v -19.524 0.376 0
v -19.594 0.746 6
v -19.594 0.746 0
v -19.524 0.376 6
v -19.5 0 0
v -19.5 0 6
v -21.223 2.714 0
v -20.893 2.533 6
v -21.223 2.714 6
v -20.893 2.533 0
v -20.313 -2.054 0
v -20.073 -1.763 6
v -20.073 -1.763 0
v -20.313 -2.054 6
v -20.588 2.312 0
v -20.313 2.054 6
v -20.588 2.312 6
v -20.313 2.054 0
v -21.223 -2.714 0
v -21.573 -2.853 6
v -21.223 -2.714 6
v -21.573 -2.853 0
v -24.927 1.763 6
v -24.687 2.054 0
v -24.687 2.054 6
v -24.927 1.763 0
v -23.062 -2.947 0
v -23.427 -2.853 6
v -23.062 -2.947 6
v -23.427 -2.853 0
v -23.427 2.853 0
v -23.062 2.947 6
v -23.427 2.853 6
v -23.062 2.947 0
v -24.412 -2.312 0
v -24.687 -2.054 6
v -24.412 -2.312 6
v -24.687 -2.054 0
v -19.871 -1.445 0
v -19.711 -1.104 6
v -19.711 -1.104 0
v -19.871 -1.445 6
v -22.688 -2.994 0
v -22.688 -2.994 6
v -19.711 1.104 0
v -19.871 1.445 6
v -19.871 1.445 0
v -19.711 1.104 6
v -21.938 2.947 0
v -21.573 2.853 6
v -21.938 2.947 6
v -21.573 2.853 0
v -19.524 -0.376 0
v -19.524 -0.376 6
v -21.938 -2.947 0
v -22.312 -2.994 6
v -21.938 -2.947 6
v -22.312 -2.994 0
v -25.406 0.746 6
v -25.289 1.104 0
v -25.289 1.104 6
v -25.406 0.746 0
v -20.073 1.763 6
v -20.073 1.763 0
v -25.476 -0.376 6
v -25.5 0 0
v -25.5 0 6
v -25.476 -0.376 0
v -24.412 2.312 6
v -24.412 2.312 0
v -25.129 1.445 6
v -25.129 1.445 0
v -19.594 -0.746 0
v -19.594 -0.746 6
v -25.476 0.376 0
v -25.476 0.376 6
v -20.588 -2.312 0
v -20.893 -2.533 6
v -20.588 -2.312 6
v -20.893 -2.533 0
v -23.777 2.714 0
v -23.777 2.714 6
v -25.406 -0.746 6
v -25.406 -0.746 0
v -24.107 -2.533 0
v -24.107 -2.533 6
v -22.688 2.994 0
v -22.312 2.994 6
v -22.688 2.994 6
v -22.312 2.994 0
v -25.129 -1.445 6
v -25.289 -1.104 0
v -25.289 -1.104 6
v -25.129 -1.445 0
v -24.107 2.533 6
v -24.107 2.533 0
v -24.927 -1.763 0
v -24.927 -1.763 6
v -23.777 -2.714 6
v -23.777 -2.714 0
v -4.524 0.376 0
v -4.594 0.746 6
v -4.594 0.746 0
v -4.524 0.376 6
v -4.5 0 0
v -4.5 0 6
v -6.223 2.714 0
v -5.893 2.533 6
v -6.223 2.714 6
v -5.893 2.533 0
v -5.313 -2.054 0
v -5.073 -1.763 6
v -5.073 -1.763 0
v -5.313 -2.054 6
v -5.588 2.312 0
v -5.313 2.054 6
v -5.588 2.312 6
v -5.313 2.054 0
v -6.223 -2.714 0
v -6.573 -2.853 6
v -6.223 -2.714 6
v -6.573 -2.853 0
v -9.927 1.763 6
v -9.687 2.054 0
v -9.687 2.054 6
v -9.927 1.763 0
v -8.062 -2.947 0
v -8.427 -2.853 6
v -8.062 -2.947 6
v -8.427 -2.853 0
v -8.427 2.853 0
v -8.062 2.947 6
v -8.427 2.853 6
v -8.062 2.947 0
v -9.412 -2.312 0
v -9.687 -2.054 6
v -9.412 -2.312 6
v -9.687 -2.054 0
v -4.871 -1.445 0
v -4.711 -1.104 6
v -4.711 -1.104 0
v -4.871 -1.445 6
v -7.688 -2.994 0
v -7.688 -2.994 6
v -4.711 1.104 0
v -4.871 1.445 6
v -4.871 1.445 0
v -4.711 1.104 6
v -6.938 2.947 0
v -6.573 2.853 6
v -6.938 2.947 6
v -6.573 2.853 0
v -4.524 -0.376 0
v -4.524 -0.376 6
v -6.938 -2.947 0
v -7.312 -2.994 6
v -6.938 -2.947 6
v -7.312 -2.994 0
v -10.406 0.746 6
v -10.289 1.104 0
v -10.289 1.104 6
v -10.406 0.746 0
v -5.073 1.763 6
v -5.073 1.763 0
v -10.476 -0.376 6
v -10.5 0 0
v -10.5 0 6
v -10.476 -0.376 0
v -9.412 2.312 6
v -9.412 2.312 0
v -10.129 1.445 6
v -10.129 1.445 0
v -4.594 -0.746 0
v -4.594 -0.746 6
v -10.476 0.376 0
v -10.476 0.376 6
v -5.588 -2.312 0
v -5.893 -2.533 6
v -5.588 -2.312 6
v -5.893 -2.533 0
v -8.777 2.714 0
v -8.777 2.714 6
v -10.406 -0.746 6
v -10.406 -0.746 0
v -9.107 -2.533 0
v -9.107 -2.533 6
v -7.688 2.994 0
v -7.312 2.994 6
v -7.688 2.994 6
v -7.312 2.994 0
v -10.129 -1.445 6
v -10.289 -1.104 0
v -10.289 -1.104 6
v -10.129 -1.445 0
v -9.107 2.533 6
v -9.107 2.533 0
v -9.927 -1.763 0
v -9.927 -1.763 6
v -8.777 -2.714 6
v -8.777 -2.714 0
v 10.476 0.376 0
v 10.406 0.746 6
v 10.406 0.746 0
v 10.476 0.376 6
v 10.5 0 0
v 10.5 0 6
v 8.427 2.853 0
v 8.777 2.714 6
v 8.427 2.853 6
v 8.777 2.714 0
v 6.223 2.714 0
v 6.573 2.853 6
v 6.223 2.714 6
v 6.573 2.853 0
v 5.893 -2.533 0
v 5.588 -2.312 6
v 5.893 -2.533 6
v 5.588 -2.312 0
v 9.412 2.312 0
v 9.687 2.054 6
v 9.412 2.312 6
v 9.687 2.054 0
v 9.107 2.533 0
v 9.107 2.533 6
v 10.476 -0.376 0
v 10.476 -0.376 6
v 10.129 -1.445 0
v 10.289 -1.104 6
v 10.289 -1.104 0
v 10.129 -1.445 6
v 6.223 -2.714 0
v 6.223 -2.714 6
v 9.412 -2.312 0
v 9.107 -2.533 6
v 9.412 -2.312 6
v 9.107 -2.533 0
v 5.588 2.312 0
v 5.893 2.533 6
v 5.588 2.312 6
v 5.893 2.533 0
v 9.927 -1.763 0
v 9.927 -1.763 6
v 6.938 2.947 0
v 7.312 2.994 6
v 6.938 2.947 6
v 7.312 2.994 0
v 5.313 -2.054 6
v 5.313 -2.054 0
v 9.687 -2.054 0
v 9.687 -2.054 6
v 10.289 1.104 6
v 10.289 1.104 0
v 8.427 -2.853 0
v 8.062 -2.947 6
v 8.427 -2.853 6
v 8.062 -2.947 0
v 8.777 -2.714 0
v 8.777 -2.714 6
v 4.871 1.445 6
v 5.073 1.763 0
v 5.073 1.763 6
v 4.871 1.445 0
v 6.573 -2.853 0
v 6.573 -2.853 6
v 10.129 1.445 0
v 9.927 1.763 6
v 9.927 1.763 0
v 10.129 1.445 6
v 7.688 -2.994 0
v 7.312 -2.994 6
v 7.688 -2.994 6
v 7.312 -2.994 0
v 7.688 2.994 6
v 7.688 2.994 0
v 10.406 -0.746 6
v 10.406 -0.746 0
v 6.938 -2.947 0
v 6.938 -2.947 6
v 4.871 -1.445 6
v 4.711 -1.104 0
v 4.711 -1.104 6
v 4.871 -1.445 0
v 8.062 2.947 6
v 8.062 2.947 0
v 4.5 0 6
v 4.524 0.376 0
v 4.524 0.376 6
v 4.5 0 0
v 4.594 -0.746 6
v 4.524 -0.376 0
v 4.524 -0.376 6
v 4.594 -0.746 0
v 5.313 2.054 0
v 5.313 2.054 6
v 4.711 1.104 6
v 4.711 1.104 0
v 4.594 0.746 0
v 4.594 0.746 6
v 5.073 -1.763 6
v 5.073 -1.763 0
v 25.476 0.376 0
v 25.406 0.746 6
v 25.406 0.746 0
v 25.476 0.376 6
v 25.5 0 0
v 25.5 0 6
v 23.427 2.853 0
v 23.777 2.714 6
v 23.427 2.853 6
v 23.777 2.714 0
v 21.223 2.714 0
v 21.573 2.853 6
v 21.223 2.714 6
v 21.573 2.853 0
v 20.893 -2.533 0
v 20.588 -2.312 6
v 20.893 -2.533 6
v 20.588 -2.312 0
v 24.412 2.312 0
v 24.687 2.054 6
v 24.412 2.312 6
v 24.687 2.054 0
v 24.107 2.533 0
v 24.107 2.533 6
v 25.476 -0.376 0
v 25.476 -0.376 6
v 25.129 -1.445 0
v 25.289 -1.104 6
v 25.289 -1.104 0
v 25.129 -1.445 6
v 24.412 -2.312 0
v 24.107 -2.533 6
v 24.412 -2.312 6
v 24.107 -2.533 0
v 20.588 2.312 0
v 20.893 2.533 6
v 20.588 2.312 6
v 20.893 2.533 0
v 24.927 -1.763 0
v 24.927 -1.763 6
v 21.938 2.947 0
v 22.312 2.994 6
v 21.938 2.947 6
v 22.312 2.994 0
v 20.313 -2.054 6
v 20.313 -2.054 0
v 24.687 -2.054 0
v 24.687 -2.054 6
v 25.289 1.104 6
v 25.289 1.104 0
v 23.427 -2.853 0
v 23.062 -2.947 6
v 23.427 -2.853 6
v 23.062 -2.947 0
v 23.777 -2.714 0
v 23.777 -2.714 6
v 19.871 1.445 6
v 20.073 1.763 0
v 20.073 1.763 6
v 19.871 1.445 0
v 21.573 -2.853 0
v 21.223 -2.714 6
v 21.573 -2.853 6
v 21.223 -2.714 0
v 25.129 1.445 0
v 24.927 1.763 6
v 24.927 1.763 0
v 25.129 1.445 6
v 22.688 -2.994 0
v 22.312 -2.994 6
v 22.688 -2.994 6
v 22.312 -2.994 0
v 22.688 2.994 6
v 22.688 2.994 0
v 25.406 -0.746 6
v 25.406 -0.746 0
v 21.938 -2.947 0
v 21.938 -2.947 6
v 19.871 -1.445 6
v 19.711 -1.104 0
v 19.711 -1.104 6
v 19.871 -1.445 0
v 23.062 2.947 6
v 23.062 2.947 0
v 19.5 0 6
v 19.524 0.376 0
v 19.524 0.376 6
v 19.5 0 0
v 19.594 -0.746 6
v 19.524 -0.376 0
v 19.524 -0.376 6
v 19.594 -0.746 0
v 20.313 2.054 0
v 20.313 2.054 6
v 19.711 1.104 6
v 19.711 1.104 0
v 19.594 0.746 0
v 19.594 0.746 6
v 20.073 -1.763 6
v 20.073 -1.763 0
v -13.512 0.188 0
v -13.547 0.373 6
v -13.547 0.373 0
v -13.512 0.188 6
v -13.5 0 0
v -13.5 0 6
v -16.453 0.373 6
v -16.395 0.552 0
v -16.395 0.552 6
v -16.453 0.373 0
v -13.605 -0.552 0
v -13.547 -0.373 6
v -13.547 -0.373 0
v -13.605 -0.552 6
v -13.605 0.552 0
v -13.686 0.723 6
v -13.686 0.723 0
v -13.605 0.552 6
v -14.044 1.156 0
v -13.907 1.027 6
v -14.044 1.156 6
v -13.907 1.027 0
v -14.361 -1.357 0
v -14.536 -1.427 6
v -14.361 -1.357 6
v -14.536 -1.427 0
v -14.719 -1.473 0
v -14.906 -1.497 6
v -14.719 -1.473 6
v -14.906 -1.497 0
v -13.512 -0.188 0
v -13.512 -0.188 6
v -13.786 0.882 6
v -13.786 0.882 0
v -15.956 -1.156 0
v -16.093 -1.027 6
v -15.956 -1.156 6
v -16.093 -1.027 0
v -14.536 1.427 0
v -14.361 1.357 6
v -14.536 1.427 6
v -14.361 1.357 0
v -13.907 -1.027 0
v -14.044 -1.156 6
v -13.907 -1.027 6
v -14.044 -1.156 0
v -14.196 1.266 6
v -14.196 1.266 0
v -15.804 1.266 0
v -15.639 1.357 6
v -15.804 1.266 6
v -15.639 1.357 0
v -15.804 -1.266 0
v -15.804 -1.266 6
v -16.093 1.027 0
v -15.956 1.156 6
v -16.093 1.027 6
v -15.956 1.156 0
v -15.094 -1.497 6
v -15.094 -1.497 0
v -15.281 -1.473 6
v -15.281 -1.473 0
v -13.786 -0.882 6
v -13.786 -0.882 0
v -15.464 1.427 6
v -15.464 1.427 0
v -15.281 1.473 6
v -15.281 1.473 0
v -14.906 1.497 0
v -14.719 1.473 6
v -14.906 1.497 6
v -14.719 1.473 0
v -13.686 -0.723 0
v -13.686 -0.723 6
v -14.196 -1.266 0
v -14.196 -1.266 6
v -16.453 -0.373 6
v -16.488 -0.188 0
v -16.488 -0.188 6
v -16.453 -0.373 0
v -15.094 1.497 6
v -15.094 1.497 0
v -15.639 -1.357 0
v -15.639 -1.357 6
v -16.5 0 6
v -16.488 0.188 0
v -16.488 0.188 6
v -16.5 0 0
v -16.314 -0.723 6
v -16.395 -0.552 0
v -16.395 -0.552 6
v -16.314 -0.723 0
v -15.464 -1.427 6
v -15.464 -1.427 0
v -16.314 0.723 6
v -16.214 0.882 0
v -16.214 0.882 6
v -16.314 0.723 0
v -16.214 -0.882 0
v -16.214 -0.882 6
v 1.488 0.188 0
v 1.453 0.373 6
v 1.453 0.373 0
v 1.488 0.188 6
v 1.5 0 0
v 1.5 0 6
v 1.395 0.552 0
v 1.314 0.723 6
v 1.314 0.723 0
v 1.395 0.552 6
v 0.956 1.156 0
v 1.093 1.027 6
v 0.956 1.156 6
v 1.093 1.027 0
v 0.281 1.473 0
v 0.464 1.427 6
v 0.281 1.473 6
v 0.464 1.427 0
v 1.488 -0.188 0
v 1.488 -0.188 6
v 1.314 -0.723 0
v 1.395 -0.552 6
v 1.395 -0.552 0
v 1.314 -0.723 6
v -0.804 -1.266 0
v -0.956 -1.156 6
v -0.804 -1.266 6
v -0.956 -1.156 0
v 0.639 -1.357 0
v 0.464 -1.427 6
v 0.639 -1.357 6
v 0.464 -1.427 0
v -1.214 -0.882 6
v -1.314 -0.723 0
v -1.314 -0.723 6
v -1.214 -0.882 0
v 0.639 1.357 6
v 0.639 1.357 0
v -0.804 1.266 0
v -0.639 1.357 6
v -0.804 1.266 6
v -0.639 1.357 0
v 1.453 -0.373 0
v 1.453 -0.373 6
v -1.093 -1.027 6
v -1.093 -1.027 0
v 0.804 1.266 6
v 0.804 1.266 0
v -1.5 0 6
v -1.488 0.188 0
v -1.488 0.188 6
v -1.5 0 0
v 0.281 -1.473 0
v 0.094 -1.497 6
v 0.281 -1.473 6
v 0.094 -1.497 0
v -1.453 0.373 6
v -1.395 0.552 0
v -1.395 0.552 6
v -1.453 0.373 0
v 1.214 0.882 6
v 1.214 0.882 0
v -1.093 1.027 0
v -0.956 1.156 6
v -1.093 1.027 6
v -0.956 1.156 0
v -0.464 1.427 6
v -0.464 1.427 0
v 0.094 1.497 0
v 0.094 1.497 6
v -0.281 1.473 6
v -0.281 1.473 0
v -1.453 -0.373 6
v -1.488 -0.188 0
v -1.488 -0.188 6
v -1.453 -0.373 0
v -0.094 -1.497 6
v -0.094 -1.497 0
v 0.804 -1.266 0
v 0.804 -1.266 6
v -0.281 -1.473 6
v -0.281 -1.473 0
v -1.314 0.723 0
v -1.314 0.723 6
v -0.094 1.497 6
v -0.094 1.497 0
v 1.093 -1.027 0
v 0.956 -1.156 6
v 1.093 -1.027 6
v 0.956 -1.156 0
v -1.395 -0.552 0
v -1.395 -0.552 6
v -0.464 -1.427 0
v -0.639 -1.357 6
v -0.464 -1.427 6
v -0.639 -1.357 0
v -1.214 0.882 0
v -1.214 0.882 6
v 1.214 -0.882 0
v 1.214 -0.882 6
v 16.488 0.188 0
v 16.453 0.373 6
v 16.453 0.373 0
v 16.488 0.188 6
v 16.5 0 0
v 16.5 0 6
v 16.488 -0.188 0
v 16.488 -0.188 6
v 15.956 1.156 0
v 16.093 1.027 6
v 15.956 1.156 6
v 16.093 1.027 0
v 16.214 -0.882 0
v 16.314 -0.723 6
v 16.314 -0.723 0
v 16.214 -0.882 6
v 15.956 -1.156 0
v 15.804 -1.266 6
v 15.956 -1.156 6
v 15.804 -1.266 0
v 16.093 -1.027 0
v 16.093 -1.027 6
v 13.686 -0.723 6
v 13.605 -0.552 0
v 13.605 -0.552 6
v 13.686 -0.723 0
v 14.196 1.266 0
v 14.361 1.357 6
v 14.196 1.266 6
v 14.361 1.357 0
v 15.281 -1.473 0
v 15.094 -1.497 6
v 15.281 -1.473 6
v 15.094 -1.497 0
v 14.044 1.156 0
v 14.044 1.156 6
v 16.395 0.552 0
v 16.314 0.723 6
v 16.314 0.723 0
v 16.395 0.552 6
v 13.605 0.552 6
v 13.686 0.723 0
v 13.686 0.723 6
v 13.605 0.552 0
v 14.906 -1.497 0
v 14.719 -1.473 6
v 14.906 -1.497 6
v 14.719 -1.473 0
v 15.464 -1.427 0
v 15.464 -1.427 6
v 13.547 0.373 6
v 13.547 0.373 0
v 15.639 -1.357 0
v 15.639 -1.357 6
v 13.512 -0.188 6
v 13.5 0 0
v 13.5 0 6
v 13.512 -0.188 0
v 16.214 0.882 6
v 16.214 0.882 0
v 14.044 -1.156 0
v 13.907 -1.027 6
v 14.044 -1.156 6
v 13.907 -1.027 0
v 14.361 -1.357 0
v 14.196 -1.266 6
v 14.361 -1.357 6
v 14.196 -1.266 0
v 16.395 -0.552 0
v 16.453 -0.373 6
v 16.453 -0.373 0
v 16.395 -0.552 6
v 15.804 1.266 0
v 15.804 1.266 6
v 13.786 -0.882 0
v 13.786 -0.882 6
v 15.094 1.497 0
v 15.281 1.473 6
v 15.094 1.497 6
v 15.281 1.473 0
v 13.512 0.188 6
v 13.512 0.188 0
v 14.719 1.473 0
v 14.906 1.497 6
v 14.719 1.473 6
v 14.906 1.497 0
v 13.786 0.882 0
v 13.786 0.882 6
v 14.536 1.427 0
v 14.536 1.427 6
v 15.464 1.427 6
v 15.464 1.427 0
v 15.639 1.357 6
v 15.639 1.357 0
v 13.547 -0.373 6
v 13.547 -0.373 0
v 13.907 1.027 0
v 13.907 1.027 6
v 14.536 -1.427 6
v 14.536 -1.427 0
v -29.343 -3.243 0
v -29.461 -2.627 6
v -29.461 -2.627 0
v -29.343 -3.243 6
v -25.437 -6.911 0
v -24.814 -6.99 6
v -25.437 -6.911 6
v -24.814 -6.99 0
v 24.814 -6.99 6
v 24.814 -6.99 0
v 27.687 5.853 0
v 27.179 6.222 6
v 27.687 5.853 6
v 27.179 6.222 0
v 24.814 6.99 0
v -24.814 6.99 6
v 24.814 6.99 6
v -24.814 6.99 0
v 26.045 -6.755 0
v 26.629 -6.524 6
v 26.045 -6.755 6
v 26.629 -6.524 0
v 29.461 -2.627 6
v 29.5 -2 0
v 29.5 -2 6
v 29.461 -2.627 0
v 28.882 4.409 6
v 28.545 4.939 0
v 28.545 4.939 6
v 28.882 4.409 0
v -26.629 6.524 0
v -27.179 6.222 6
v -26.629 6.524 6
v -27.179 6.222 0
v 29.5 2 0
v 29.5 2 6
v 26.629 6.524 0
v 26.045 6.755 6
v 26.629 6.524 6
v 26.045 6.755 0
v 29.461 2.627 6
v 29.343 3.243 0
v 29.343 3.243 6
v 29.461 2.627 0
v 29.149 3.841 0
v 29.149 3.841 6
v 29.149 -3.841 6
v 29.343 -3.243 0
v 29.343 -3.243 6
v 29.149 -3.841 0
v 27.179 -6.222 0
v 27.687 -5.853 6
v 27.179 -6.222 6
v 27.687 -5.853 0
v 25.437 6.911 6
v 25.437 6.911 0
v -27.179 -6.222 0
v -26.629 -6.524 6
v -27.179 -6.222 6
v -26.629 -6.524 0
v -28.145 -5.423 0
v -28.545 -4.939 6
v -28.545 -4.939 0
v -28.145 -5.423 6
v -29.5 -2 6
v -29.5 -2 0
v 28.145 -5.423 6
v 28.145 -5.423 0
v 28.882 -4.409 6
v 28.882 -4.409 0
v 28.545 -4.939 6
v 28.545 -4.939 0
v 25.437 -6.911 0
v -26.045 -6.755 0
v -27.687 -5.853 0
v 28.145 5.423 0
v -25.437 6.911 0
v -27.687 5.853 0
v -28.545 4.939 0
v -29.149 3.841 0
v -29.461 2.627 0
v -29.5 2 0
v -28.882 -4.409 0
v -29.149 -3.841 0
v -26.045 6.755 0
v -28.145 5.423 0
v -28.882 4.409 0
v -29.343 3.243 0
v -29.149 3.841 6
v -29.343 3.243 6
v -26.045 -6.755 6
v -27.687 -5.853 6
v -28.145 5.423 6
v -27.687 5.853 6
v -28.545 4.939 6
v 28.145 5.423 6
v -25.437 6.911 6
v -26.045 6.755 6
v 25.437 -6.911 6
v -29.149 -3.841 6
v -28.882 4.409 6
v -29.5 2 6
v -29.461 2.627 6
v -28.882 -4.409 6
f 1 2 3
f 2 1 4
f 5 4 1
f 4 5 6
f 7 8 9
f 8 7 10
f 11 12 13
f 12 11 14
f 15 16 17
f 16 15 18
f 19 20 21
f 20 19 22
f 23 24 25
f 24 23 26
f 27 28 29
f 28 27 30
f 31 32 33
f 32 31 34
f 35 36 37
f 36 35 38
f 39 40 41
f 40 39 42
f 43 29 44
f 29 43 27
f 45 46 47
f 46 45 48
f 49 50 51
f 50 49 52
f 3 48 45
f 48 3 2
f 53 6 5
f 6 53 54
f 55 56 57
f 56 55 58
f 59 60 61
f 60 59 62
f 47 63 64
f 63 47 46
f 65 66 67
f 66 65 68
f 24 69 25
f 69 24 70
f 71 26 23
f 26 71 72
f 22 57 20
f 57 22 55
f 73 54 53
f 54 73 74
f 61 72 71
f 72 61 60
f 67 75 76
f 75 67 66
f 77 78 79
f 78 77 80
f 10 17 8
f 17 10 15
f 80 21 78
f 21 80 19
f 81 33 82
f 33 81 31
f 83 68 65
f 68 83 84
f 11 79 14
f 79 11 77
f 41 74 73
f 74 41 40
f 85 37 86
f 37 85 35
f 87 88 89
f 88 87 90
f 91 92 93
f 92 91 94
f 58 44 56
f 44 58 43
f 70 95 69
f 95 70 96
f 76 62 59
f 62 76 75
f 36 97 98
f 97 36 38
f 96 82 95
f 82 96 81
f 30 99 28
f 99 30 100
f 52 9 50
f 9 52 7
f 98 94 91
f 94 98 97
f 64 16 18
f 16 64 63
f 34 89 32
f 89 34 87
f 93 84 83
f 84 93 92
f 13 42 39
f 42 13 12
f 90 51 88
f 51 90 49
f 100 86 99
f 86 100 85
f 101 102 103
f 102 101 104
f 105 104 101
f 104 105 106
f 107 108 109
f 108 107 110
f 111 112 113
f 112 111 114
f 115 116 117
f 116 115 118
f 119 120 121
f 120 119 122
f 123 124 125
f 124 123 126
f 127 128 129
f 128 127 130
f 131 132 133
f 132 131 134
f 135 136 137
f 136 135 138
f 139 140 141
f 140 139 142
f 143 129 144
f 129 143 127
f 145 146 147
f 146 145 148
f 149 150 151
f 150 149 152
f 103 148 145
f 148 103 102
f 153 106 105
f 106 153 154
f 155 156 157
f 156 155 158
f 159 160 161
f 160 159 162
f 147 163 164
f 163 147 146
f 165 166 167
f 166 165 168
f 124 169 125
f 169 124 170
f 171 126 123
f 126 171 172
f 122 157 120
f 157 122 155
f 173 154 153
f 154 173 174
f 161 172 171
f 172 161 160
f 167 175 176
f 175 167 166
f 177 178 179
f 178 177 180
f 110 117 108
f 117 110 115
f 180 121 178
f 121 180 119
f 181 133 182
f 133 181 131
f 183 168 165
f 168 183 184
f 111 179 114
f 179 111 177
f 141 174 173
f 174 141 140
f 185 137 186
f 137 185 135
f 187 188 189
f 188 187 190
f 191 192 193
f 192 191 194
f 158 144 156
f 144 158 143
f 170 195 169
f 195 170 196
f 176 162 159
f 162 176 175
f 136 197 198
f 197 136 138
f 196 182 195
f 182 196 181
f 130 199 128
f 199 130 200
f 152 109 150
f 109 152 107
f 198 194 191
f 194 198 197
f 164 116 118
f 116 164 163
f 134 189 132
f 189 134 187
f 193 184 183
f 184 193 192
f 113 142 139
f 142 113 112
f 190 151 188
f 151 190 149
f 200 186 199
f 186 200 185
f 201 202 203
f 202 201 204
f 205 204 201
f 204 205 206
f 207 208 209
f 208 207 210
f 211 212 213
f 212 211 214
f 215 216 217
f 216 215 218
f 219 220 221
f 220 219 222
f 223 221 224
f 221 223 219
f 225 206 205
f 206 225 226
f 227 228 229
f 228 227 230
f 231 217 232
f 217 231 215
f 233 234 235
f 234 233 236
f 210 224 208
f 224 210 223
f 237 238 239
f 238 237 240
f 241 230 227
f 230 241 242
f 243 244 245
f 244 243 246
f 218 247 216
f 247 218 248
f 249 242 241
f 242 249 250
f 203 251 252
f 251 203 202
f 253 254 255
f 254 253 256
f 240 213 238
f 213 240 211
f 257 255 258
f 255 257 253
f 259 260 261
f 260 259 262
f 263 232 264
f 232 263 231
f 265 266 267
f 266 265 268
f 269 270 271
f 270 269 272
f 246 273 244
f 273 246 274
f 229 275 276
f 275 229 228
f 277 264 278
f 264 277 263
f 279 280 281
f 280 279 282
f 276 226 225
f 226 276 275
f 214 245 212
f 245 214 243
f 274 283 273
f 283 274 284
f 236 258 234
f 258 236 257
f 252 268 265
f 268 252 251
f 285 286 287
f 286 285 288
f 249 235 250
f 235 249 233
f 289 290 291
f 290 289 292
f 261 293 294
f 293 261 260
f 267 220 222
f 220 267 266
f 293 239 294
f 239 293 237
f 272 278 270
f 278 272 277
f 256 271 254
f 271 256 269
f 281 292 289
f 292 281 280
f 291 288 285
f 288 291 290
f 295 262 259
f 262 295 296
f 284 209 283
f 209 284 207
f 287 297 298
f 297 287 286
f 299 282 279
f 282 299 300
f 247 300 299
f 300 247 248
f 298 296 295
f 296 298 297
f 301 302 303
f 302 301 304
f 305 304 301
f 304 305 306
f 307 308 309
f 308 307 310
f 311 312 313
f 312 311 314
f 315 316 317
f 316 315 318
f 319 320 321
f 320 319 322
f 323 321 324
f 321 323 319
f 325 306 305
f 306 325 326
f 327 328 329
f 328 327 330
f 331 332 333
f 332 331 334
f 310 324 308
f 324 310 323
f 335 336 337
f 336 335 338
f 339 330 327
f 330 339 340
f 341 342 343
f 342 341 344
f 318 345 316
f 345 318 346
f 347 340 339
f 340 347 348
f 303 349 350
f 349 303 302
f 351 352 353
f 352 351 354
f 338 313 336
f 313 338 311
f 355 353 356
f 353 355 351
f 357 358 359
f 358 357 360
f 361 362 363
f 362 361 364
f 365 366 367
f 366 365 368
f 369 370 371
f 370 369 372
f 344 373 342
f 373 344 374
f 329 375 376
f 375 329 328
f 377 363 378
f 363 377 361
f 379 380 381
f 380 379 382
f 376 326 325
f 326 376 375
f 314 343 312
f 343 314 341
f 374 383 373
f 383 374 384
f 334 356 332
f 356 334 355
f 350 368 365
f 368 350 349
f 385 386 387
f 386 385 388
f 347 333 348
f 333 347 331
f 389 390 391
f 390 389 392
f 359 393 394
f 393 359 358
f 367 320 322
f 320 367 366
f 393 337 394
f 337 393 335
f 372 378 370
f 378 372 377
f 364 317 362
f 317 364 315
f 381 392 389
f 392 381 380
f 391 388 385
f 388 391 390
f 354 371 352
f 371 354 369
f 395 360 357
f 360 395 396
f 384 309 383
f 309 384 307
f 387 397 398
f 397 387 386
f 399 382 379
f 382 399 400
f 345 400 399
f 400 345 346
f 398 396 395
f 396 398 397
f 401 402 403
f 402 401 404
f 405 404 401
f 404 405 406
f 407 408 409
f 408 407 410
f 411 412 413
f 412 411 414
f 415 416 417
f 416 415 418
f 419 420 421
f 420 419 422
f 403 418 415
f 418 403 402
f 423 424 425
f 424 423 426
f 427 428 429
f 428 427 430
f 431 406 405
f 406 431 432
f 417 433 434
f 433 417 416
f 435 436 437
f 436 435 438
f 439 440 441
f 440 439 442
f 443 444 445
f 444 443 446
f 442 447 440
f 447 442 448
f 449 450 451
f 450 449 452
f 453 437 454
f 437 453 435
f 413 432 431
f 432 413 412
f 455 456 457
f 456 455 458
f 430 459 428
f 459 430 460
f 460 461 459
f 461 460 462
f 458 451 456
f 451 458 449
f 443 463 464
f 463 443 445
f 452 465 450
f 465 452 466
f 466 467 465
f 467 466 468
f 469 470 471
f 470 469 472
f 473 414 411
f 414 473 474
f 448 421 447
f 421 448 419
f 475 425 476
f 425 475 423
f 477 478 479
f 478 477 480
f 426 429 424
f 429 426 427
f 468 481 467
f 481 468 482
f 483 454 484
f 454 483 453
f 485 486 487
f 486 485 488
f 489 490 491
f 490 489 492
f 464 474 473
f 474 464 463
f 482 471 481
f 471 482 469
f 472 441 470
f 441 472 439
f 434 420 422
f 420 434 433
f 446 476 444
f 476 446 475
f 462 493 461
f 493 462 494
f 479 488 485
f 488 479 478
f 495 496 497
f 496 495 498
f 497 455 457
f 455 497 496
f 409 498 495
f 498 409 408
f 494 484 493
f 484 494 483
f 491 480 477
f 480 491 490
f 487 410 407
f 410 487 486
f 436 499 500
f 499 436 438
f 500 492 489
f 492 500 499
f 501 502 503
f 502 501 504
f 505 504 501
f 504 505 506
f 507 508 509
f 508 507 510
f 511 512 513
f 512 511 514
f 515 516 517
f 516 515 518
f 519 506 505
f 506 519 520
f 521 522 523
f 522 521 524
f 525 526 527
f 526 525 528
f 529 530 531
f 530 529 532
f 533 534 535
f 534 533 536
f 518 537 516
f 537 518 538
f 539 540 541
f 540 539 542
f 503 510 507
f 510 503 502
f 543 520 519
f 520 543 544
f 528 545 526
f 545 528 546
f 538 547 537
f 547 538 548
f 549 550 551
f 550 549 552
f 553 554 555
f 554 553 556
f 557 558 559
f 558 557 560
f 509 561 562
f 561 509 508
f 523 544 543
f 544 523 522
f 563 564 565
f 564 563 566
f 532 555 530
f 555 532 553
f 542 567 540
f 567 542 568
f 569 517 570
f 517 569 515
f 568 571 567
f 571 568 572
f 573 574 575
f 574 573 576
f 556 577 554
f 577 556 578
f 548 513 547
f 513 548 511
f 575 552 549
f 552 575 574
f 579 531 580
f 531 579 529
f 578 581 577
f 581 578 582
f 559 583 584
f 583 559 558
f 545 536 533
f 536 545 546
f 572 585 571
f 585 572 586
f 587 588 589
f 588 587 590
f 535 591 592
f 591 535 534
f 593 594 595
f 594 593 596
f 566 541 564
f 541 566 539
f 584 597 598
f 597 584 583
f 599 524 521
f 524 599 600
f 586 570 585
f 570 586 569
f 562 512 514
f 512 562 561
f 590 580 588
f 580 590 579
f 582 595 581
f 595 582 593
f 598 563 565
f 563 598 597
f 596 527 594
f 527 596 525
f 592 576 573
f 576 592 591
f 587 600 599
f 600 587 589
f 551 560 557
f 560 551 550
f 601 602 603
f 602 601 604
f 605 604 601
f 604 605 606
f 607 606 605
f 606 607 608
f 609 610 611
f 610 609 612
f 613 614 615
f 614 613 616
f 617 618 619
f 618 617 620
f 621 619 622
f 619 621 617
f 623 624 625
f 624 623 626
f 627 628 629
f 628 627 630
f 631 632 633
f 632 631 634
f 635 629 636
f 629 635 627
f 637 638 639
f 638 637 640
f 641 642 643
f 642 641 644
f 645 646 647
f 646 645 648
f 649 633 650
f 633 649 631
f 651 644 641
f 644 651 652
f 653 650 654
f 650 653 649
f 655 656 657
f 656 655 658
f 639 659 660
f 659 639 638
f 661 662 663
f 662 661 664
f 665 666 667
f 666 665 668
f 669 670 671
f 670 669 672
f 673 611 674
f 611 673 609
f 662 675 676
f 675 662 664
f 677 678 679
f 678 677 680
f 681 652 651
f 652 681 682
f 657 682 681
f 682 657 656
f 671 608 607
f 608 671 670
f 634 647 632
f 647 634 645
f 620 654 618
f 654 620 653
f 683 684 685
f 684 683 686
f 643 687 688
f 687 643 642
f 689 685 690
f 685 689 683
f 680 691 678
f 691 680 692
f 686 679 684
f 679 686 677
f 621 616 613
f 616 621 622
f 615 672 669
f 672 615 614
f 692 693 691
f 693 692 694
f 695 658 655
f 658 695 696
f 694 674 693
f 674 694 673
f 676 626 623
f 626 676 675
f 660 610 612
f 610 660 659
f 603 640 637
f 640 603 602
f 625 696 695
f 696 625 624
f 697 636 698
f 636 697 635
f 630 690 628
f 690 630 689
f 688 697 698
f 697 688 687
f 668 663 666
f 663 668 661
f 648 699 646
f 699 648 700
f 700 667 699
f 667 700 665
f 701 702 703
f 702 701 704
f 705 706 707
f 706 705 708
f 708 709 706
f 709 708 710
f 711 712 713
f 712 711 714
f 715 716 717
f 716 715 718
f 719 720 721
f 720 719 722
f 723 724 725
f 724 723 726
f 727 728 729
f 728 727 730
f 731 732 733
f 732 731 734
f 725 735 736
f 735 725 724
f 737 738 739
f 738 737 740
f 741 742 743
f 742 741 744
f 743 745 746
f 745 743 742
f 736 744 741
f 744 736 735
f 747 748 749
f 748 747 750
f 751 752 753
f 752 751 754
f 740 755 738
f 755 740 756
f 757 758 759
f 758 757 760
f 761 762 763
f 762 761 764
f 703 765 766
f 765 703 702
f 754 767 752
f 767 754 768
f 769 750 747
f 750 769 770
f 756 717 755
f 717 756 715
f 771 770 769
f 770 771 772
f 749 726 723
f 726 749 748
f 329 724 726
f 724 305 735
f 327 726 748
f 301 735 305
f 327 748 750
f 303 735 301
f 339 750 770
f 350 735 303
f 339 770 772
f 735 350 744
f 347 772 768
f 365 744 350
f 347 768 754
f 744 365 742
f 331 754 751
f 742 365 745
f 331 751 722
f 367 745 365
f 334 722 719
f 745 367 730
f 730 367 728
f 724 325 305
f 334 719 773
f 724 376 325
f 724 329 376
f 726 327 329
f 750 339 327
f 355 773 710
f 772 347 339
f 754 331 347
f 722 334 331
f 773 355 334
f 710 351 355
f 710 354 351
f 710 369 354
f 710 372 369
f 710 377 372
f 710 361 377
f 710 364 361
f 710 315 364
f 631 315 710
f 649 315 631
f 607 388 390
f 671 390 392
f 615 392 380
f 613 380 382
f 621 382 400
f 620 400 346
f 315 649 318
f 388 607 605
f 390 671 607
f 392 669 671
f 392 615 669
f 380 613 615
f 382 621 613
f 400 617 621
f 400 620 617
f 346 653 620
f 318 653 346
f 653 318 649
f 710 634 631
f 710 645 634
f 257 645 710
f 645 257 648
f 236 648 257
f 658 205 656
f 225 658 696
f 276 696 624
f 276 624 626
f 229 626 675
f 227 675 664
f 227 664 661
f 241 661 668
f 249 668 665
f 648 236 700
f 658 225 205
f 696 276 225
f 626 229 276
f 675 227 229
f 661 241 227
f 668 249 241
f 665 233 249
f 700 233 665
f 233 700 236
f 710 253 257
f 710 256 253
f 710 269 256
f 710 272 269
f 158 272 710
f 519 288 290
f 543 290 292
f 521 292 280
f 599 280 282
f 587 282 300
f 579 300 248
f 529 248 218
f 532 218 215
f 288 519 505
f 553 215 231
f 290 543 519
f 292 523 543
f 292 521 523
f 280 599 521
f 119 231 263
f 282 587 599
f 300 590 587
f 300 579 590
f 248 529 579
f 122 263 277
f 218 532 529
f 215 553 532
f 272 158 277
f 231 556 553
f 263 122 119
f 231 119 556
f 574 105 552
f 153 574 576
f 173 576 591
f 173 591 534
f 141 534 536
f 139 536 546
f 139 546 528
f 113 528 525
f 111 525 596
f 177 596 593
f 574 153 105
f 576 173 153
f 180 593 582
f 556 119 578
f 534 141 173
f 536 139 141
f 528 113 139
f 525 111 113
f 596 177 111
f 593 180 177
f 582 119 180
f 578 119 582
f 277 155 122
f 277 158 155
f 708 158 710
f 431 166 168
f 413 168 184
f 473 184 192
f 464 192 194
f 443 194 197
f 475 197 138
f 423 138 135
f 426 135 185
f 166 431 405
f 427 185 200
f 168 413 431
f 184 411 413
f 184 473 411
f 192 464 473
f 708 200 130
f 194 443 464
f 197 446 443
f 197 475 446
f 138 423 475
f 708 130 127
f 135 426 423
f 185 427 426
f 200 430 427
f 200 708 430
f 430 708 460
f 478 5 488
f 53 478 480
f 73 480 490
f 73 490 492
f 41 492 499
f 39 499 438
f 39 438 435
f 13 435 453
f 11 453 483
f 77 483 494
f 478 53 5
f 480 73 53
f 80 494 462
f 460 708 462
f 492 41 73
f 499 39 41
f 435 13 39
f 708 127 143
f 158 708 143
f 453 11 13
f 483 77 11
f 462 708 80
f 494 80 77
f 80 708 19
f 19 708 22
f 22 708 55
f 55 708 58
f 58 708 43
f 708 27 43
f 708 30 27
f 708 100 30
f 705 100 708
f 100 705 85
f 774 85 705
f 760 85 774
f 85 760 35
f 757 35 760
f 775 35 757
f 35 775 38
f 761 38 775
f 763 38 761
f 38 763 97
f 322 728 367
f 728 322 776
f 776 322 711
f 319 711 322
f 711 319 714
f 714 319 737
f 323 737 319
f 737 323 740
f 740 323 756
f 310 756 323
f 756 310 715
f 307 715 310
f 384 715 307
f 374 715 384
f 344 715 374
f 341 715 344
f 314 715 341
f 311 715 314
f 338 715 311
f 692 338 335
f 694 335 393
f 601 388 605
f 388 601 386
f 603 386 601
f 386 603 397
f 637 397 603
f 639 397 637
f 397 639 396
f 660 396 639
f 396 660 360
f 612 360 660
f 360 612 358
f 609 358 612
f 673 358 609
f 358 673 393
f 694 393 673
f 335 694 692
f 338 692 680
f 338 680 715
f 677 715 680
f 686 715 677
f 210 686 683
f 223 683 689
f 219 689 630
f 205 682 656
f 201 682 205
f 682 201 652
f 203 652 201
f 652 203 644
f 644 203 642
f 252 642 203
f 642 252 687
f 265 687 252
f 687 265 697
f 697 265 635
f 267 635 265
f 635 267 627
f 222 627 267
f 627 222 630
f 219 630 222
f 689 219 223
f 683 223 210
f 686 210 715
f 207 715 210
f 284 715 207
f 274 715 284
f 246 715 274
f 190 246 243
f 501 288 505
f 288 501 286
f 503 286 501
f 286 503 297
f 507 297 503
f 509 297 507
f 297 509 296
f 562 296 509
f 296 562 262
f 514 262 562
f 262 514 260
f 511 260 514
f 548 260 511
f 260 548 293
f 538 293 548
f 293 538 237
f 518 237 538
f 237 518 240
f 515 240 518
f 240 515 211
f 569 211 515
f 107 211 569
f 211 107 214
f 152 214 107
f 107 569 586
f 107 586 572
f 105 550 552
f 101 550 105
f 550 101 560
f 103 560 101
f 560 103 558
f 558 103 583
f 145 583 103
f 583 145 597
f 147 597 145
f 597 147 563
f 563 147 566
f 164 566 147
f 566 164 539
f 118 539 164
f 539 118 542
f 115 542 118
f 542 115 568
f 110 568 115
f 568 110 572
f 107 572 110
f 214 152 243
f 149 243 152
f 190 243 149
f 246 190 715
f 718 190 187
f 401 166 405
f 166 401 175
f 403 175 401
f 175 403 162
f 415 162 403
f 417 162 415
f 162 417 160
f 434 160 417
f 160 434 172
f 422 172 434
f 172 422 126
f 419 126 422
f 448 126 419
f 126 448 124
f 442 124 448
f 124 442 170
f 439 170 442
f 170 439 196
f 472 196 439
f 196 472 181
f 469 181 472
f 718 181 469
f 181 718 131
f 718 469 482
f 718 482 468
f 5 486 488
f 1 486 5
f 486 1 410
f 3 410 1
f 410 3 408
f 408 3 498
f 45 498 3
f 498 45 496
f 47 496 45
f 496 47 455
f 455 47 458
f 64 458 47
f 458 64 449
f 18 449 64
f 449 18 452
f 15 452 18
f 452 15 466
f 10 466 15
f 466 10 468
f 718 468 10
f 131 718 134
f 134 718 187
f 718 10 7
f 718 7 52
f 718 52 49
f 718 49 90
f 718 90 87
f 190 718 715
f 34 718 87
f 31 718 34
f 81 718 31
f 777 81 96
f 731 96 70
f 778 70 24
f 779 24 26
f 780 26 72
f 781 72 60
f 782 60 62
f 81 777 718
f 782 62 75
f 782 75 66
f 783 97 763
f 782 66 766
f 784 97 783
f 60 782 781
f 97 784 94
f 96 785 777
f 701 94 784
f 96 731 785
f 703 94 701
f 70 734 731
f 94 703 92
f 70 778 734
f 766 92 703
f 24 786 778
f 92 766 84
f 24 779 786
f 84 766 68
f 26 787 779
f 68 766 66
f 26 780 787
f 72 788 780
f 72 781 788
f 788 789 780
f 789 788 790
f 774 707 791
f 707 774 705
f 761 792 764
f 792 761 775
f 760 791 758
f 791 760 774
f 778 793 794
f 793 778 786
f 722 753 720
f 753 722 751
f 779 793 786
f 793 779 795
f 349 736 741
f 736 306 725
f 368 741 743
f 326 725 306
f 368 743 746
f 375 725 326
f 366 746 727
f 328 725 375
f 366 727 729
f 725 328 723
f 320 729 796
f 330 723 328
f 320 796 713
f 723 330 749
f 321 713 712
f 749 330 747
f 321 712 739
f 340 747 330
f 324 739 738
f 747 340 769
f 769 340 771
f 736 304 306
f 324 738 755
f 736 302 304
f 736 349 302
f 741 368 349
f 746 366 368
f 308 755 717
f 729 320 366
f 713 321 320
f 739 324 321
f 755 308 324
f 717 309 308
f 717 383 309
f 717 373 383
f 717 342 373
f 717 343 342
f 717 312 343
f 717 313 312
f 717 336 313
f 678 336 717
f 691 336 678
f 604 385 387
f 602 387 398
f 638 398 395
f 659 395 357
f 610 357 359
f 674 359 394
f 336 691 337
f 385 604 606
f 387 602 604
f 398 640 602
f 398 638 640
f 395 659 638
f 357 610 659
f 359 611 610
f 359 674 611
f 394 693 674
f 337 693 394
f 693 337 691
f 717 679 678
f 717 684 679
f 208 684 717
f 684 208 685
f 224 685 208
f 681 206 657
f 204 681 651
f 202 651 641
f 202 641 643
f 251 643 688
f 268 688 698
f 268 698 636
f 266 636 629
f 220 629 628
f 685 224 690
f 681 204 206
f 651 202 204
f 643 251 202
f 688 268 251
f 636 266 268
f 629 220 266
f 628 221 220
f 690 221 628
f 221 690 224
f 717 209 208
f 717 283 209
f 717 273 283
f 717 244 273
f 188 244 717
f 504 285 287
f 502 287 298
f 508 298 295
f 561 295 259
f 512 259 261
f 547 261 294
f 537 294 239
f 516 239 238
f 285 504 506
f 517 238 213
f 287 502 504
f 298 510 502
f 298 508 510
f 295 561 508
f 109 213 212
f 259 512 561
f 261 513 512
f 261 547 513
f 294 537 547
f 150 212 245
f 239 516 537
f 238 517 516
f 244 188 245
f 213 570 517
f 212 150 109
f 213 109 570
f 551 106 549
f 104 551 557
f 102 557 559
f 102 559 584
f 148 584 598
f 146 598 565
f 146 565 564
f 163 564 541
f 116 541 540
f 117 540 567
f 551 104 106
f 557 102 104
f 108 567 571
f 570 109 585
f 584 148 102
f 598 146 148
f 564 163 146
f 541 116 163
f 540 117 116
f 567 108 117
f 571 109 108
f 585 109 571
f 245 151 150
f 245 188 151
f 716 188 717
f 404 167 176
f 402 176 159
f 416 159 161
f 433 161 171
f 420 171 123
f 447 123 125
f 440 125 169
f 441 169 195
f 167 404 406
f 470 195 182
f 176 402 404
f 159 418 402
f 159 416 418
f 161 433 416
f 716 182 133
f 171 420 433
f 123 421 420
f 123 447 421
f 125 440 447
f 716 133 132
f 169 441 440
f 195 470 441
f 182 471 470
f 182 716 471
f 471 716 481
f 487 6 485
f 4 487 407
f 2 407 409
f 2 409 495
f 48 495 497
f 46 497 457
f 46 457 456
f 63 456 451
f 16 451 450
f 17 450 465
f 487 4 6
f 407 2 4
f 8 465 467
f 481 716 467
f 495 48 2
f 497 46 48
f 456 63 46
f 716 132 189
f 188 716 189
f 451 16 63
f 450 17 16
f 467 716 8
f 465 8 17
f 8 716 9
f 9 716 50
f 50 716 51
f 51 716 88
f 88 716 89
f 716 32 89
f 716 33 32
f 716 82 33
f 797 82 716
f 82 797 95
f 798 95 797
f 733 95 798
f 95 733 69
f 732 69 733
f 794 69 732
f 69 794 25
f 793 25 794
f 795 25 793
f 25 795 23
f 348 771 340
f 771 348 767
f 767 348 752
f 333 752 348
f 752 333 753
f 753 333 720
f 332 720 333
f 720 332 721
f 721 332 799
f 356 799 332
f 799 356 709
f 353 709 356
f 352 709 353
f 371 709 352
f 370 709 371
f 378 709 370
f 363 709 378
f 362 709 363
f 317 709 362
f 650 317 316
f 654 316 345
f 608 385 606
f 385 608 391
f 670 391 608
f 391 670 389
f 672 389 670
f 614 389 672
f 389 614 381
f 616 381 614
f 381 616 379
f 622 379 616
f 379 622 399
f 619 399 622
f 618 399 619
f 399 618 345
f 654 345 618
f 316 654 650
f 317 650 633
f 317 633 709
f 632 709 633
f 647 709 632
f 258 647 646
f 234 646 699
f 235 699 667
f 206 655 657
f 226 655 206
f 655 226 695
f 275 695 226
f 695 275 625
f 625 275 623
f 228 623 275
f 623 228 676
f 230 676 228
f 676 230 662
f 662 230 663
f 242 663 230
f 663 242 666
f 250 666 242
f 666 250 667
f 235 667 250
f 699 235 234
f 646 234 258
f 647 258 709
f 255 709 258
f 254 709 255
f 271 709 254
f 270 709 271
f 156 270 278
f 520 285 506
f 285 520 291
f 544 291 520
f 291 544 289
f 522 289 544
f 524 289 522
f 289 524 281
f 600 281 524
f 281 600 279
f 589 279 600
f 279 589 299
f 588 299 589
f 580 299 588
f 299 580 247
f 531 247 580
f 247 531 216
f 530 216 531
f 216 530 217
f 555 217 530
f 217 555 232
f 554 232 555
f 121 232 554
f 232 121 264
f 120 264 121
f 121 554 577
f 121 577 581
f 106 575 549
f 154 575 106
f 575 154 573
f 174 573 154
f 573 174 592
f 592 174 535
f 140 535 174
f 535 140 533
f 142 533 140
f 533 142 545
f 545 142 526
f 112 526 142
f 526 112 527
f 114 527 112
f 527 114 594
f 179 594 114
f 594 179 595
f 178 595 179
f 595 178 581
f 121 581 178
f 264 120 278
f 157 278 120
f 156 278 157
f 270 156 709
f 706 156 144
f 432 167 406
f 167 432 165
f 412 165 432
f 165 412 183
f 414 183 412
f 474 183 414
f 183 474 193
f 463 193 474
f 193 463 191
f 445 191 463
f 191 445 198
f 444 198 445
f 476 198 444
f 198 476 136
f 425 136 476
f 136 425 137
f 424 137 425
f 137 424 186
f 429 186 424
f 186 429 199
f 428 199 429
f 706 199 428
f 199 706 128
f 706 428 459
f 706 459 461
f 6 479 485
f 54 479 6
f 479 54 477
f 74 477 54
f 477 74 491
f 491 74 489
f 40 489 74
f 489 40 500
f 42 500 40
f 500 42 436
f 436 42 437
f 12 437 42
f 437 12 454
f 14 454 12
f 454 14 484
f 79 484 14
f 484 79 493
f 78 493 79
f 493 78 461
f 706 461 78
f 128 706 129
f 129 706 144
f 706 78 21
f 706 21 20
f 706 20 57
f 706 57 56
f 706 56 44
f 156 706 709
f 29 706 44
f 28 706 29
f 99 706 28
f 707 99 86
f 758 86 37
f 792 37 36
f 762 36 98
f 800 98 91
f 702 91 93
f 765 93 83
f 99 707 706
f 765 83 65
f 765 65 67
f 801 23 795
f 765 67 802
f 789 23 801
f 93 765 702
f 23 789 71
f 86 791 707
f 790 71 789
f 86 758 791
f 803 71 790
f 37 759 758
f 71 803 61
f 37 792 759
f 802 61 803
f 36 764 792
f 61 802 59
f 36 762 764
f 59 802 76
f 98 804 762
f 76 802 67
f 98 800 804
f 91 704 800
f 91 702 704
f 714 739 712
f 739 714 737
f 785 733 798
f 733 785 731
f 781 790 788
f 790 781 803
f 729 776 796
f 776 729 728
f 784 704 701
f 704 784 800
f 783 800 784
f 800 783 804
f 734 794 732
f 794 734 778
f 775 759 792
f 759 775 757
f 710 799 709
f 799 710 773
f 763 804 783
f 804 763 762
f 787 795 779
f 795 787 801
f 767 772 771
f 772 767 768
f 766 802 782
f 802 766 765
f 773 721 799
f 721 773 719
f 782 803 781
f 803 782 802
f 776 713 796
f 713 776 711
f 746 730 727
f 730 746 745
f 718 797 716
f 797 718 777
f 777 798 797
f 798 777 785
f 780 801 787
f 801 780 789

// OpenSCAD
$fn = 50;


difference() {
	union() {
		hull() {
			translate(v = [-24.5000000000, 2.0000000000, 0]) {
				cylinder(h = 6, r = 5);
			}
			translate(v = [24.5000000000, 2.0000000000, 0]) {
				cylinder(h = 6, r = 5);
			}
			translate(v = [-24.5000000000, -2.0000000000, 0]) {
				cylinder(h = 6, r = 5);
			}
			translate(v = [24.5000000000, -2.0000000000, 0]) {
				cylinder(h = 6, r = 5);
			}
		}
	}
	union() {
		translate(v = [-22.5000000000, 0.0000000000, 0]) {
			translate(v = [0, 0, -100]) {
				cylinder(h = 200, r = 3.0000000000);
			}
		}
		translate(v = [-7.5000000000, 0.0000000000, 0]) {
			translate(v = [0, 0, -100]) {
				cylinder(h = 200, r = 3.0000000000);
			}
		}
		translate(v = [7.5000000000, 0.0000000000, 0]) {
			translate(v = [0, 0, -100]) {
				cylinder(h = 200, r = 3.0000000000);
			}
		}
		translate(v = [22.5000000000, 0.0000000000, 0]) {
			translate(v = [0, 0, -100]) {
				cylinder(h = 200, r = 3.0000000000);
			}
		}
		translate(v = [-22.5000000000, 0.0000000000, 0]) {
			translate(v = [0, 0, -100]) {
				cylinder(h = 200, r = 1.5000000000);
			}
		}
		translate(v = [-15.0000000000, 0.0000000000, 0]) {
			translate(v = [0, 0, -100]) {
				cylinder(h = 200, r = 1.5000000000);
			}
		}
		translate(v = [-7.5000000000, 0.0000000000, 0]) {
			translate(v = [0, 0, -100]) {
				cylinder(h = 200, r = 1.5000000000);
			}
		}
		translate(v = [0, 0, -100]) {
			cylinder(h = 200, r = 1.5000000000);
		}
		translate(v = [7.5000000000, 0.0000000000, 0]) {
			translate(v = [0, 0, -100]) {
				cylinder(h = 200, r = 1.5000000000);
			}
		}
		translate(v = [15.0000000000, 0.0000000000, 0]) {
			translate(v = [0, 0, -100]) {
				cylinder(h = 200, r = 1.5000000000);
			}
		}
		translate(v = [22.5000000000, 0.0000000000, 0]) {
			translate(v = [0, 0, -100]) {
				cylinder(h = 200, r = 1.5000000000);
			}
		}
	}
}
